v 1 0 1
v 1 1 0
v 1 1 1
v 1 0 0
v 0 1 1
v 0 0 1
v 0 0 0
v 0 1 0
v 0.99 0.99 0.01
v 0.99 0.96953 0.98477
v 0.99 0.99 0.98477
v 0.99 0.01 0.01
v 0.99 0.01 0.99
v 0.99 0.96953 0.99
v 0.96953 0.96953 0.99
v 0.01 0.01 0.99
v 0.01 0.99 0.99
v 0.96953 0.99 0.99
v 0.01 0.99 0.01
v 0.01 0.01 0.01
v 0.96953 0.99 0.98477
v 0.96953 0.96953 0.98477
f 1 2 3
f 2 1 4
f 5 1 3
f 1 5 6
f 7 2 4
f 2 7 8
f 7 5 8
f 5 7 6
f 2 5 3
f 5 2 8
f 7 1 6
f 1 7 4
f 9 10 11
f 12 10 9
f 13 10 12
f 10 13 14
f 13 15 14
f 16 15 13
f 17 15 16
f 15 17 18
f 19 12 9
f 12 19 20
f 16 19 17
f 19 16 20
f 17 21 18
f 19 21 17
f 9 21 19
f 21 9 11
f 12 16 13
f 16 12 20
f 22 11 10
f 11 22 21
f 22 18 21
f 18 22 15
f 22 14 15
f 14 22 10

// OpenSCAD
translate([0.984375, 0.984375, 0.9921875]) color([0.9928586924360654, 0.247192741454632, 0.70975753974483]) cube([0.0296875, 0.0296875, 0.01484375], center=true);
translate([0.984375, 0.984375, 0.9921875]) color([0.13794757021236903, 0.4611444179186315, 0.04899626755467579]) cube([0.0296875, 0.0296875, 0.01484375], center=true);
translate([0.984375, 0.984375, 0.9921875]) color([0.1977229983916683, 0.036370797334404625, 0.13840798504488894]) cube([0.0296875, 0.0296875, 0.01484375], center=true);
color([0.3,0.3,0.3,0.3]) difference() { cube([1,1,1]); translate([0.01,0.01,0.01]) cube([0.98,0.98,0.98]); }
